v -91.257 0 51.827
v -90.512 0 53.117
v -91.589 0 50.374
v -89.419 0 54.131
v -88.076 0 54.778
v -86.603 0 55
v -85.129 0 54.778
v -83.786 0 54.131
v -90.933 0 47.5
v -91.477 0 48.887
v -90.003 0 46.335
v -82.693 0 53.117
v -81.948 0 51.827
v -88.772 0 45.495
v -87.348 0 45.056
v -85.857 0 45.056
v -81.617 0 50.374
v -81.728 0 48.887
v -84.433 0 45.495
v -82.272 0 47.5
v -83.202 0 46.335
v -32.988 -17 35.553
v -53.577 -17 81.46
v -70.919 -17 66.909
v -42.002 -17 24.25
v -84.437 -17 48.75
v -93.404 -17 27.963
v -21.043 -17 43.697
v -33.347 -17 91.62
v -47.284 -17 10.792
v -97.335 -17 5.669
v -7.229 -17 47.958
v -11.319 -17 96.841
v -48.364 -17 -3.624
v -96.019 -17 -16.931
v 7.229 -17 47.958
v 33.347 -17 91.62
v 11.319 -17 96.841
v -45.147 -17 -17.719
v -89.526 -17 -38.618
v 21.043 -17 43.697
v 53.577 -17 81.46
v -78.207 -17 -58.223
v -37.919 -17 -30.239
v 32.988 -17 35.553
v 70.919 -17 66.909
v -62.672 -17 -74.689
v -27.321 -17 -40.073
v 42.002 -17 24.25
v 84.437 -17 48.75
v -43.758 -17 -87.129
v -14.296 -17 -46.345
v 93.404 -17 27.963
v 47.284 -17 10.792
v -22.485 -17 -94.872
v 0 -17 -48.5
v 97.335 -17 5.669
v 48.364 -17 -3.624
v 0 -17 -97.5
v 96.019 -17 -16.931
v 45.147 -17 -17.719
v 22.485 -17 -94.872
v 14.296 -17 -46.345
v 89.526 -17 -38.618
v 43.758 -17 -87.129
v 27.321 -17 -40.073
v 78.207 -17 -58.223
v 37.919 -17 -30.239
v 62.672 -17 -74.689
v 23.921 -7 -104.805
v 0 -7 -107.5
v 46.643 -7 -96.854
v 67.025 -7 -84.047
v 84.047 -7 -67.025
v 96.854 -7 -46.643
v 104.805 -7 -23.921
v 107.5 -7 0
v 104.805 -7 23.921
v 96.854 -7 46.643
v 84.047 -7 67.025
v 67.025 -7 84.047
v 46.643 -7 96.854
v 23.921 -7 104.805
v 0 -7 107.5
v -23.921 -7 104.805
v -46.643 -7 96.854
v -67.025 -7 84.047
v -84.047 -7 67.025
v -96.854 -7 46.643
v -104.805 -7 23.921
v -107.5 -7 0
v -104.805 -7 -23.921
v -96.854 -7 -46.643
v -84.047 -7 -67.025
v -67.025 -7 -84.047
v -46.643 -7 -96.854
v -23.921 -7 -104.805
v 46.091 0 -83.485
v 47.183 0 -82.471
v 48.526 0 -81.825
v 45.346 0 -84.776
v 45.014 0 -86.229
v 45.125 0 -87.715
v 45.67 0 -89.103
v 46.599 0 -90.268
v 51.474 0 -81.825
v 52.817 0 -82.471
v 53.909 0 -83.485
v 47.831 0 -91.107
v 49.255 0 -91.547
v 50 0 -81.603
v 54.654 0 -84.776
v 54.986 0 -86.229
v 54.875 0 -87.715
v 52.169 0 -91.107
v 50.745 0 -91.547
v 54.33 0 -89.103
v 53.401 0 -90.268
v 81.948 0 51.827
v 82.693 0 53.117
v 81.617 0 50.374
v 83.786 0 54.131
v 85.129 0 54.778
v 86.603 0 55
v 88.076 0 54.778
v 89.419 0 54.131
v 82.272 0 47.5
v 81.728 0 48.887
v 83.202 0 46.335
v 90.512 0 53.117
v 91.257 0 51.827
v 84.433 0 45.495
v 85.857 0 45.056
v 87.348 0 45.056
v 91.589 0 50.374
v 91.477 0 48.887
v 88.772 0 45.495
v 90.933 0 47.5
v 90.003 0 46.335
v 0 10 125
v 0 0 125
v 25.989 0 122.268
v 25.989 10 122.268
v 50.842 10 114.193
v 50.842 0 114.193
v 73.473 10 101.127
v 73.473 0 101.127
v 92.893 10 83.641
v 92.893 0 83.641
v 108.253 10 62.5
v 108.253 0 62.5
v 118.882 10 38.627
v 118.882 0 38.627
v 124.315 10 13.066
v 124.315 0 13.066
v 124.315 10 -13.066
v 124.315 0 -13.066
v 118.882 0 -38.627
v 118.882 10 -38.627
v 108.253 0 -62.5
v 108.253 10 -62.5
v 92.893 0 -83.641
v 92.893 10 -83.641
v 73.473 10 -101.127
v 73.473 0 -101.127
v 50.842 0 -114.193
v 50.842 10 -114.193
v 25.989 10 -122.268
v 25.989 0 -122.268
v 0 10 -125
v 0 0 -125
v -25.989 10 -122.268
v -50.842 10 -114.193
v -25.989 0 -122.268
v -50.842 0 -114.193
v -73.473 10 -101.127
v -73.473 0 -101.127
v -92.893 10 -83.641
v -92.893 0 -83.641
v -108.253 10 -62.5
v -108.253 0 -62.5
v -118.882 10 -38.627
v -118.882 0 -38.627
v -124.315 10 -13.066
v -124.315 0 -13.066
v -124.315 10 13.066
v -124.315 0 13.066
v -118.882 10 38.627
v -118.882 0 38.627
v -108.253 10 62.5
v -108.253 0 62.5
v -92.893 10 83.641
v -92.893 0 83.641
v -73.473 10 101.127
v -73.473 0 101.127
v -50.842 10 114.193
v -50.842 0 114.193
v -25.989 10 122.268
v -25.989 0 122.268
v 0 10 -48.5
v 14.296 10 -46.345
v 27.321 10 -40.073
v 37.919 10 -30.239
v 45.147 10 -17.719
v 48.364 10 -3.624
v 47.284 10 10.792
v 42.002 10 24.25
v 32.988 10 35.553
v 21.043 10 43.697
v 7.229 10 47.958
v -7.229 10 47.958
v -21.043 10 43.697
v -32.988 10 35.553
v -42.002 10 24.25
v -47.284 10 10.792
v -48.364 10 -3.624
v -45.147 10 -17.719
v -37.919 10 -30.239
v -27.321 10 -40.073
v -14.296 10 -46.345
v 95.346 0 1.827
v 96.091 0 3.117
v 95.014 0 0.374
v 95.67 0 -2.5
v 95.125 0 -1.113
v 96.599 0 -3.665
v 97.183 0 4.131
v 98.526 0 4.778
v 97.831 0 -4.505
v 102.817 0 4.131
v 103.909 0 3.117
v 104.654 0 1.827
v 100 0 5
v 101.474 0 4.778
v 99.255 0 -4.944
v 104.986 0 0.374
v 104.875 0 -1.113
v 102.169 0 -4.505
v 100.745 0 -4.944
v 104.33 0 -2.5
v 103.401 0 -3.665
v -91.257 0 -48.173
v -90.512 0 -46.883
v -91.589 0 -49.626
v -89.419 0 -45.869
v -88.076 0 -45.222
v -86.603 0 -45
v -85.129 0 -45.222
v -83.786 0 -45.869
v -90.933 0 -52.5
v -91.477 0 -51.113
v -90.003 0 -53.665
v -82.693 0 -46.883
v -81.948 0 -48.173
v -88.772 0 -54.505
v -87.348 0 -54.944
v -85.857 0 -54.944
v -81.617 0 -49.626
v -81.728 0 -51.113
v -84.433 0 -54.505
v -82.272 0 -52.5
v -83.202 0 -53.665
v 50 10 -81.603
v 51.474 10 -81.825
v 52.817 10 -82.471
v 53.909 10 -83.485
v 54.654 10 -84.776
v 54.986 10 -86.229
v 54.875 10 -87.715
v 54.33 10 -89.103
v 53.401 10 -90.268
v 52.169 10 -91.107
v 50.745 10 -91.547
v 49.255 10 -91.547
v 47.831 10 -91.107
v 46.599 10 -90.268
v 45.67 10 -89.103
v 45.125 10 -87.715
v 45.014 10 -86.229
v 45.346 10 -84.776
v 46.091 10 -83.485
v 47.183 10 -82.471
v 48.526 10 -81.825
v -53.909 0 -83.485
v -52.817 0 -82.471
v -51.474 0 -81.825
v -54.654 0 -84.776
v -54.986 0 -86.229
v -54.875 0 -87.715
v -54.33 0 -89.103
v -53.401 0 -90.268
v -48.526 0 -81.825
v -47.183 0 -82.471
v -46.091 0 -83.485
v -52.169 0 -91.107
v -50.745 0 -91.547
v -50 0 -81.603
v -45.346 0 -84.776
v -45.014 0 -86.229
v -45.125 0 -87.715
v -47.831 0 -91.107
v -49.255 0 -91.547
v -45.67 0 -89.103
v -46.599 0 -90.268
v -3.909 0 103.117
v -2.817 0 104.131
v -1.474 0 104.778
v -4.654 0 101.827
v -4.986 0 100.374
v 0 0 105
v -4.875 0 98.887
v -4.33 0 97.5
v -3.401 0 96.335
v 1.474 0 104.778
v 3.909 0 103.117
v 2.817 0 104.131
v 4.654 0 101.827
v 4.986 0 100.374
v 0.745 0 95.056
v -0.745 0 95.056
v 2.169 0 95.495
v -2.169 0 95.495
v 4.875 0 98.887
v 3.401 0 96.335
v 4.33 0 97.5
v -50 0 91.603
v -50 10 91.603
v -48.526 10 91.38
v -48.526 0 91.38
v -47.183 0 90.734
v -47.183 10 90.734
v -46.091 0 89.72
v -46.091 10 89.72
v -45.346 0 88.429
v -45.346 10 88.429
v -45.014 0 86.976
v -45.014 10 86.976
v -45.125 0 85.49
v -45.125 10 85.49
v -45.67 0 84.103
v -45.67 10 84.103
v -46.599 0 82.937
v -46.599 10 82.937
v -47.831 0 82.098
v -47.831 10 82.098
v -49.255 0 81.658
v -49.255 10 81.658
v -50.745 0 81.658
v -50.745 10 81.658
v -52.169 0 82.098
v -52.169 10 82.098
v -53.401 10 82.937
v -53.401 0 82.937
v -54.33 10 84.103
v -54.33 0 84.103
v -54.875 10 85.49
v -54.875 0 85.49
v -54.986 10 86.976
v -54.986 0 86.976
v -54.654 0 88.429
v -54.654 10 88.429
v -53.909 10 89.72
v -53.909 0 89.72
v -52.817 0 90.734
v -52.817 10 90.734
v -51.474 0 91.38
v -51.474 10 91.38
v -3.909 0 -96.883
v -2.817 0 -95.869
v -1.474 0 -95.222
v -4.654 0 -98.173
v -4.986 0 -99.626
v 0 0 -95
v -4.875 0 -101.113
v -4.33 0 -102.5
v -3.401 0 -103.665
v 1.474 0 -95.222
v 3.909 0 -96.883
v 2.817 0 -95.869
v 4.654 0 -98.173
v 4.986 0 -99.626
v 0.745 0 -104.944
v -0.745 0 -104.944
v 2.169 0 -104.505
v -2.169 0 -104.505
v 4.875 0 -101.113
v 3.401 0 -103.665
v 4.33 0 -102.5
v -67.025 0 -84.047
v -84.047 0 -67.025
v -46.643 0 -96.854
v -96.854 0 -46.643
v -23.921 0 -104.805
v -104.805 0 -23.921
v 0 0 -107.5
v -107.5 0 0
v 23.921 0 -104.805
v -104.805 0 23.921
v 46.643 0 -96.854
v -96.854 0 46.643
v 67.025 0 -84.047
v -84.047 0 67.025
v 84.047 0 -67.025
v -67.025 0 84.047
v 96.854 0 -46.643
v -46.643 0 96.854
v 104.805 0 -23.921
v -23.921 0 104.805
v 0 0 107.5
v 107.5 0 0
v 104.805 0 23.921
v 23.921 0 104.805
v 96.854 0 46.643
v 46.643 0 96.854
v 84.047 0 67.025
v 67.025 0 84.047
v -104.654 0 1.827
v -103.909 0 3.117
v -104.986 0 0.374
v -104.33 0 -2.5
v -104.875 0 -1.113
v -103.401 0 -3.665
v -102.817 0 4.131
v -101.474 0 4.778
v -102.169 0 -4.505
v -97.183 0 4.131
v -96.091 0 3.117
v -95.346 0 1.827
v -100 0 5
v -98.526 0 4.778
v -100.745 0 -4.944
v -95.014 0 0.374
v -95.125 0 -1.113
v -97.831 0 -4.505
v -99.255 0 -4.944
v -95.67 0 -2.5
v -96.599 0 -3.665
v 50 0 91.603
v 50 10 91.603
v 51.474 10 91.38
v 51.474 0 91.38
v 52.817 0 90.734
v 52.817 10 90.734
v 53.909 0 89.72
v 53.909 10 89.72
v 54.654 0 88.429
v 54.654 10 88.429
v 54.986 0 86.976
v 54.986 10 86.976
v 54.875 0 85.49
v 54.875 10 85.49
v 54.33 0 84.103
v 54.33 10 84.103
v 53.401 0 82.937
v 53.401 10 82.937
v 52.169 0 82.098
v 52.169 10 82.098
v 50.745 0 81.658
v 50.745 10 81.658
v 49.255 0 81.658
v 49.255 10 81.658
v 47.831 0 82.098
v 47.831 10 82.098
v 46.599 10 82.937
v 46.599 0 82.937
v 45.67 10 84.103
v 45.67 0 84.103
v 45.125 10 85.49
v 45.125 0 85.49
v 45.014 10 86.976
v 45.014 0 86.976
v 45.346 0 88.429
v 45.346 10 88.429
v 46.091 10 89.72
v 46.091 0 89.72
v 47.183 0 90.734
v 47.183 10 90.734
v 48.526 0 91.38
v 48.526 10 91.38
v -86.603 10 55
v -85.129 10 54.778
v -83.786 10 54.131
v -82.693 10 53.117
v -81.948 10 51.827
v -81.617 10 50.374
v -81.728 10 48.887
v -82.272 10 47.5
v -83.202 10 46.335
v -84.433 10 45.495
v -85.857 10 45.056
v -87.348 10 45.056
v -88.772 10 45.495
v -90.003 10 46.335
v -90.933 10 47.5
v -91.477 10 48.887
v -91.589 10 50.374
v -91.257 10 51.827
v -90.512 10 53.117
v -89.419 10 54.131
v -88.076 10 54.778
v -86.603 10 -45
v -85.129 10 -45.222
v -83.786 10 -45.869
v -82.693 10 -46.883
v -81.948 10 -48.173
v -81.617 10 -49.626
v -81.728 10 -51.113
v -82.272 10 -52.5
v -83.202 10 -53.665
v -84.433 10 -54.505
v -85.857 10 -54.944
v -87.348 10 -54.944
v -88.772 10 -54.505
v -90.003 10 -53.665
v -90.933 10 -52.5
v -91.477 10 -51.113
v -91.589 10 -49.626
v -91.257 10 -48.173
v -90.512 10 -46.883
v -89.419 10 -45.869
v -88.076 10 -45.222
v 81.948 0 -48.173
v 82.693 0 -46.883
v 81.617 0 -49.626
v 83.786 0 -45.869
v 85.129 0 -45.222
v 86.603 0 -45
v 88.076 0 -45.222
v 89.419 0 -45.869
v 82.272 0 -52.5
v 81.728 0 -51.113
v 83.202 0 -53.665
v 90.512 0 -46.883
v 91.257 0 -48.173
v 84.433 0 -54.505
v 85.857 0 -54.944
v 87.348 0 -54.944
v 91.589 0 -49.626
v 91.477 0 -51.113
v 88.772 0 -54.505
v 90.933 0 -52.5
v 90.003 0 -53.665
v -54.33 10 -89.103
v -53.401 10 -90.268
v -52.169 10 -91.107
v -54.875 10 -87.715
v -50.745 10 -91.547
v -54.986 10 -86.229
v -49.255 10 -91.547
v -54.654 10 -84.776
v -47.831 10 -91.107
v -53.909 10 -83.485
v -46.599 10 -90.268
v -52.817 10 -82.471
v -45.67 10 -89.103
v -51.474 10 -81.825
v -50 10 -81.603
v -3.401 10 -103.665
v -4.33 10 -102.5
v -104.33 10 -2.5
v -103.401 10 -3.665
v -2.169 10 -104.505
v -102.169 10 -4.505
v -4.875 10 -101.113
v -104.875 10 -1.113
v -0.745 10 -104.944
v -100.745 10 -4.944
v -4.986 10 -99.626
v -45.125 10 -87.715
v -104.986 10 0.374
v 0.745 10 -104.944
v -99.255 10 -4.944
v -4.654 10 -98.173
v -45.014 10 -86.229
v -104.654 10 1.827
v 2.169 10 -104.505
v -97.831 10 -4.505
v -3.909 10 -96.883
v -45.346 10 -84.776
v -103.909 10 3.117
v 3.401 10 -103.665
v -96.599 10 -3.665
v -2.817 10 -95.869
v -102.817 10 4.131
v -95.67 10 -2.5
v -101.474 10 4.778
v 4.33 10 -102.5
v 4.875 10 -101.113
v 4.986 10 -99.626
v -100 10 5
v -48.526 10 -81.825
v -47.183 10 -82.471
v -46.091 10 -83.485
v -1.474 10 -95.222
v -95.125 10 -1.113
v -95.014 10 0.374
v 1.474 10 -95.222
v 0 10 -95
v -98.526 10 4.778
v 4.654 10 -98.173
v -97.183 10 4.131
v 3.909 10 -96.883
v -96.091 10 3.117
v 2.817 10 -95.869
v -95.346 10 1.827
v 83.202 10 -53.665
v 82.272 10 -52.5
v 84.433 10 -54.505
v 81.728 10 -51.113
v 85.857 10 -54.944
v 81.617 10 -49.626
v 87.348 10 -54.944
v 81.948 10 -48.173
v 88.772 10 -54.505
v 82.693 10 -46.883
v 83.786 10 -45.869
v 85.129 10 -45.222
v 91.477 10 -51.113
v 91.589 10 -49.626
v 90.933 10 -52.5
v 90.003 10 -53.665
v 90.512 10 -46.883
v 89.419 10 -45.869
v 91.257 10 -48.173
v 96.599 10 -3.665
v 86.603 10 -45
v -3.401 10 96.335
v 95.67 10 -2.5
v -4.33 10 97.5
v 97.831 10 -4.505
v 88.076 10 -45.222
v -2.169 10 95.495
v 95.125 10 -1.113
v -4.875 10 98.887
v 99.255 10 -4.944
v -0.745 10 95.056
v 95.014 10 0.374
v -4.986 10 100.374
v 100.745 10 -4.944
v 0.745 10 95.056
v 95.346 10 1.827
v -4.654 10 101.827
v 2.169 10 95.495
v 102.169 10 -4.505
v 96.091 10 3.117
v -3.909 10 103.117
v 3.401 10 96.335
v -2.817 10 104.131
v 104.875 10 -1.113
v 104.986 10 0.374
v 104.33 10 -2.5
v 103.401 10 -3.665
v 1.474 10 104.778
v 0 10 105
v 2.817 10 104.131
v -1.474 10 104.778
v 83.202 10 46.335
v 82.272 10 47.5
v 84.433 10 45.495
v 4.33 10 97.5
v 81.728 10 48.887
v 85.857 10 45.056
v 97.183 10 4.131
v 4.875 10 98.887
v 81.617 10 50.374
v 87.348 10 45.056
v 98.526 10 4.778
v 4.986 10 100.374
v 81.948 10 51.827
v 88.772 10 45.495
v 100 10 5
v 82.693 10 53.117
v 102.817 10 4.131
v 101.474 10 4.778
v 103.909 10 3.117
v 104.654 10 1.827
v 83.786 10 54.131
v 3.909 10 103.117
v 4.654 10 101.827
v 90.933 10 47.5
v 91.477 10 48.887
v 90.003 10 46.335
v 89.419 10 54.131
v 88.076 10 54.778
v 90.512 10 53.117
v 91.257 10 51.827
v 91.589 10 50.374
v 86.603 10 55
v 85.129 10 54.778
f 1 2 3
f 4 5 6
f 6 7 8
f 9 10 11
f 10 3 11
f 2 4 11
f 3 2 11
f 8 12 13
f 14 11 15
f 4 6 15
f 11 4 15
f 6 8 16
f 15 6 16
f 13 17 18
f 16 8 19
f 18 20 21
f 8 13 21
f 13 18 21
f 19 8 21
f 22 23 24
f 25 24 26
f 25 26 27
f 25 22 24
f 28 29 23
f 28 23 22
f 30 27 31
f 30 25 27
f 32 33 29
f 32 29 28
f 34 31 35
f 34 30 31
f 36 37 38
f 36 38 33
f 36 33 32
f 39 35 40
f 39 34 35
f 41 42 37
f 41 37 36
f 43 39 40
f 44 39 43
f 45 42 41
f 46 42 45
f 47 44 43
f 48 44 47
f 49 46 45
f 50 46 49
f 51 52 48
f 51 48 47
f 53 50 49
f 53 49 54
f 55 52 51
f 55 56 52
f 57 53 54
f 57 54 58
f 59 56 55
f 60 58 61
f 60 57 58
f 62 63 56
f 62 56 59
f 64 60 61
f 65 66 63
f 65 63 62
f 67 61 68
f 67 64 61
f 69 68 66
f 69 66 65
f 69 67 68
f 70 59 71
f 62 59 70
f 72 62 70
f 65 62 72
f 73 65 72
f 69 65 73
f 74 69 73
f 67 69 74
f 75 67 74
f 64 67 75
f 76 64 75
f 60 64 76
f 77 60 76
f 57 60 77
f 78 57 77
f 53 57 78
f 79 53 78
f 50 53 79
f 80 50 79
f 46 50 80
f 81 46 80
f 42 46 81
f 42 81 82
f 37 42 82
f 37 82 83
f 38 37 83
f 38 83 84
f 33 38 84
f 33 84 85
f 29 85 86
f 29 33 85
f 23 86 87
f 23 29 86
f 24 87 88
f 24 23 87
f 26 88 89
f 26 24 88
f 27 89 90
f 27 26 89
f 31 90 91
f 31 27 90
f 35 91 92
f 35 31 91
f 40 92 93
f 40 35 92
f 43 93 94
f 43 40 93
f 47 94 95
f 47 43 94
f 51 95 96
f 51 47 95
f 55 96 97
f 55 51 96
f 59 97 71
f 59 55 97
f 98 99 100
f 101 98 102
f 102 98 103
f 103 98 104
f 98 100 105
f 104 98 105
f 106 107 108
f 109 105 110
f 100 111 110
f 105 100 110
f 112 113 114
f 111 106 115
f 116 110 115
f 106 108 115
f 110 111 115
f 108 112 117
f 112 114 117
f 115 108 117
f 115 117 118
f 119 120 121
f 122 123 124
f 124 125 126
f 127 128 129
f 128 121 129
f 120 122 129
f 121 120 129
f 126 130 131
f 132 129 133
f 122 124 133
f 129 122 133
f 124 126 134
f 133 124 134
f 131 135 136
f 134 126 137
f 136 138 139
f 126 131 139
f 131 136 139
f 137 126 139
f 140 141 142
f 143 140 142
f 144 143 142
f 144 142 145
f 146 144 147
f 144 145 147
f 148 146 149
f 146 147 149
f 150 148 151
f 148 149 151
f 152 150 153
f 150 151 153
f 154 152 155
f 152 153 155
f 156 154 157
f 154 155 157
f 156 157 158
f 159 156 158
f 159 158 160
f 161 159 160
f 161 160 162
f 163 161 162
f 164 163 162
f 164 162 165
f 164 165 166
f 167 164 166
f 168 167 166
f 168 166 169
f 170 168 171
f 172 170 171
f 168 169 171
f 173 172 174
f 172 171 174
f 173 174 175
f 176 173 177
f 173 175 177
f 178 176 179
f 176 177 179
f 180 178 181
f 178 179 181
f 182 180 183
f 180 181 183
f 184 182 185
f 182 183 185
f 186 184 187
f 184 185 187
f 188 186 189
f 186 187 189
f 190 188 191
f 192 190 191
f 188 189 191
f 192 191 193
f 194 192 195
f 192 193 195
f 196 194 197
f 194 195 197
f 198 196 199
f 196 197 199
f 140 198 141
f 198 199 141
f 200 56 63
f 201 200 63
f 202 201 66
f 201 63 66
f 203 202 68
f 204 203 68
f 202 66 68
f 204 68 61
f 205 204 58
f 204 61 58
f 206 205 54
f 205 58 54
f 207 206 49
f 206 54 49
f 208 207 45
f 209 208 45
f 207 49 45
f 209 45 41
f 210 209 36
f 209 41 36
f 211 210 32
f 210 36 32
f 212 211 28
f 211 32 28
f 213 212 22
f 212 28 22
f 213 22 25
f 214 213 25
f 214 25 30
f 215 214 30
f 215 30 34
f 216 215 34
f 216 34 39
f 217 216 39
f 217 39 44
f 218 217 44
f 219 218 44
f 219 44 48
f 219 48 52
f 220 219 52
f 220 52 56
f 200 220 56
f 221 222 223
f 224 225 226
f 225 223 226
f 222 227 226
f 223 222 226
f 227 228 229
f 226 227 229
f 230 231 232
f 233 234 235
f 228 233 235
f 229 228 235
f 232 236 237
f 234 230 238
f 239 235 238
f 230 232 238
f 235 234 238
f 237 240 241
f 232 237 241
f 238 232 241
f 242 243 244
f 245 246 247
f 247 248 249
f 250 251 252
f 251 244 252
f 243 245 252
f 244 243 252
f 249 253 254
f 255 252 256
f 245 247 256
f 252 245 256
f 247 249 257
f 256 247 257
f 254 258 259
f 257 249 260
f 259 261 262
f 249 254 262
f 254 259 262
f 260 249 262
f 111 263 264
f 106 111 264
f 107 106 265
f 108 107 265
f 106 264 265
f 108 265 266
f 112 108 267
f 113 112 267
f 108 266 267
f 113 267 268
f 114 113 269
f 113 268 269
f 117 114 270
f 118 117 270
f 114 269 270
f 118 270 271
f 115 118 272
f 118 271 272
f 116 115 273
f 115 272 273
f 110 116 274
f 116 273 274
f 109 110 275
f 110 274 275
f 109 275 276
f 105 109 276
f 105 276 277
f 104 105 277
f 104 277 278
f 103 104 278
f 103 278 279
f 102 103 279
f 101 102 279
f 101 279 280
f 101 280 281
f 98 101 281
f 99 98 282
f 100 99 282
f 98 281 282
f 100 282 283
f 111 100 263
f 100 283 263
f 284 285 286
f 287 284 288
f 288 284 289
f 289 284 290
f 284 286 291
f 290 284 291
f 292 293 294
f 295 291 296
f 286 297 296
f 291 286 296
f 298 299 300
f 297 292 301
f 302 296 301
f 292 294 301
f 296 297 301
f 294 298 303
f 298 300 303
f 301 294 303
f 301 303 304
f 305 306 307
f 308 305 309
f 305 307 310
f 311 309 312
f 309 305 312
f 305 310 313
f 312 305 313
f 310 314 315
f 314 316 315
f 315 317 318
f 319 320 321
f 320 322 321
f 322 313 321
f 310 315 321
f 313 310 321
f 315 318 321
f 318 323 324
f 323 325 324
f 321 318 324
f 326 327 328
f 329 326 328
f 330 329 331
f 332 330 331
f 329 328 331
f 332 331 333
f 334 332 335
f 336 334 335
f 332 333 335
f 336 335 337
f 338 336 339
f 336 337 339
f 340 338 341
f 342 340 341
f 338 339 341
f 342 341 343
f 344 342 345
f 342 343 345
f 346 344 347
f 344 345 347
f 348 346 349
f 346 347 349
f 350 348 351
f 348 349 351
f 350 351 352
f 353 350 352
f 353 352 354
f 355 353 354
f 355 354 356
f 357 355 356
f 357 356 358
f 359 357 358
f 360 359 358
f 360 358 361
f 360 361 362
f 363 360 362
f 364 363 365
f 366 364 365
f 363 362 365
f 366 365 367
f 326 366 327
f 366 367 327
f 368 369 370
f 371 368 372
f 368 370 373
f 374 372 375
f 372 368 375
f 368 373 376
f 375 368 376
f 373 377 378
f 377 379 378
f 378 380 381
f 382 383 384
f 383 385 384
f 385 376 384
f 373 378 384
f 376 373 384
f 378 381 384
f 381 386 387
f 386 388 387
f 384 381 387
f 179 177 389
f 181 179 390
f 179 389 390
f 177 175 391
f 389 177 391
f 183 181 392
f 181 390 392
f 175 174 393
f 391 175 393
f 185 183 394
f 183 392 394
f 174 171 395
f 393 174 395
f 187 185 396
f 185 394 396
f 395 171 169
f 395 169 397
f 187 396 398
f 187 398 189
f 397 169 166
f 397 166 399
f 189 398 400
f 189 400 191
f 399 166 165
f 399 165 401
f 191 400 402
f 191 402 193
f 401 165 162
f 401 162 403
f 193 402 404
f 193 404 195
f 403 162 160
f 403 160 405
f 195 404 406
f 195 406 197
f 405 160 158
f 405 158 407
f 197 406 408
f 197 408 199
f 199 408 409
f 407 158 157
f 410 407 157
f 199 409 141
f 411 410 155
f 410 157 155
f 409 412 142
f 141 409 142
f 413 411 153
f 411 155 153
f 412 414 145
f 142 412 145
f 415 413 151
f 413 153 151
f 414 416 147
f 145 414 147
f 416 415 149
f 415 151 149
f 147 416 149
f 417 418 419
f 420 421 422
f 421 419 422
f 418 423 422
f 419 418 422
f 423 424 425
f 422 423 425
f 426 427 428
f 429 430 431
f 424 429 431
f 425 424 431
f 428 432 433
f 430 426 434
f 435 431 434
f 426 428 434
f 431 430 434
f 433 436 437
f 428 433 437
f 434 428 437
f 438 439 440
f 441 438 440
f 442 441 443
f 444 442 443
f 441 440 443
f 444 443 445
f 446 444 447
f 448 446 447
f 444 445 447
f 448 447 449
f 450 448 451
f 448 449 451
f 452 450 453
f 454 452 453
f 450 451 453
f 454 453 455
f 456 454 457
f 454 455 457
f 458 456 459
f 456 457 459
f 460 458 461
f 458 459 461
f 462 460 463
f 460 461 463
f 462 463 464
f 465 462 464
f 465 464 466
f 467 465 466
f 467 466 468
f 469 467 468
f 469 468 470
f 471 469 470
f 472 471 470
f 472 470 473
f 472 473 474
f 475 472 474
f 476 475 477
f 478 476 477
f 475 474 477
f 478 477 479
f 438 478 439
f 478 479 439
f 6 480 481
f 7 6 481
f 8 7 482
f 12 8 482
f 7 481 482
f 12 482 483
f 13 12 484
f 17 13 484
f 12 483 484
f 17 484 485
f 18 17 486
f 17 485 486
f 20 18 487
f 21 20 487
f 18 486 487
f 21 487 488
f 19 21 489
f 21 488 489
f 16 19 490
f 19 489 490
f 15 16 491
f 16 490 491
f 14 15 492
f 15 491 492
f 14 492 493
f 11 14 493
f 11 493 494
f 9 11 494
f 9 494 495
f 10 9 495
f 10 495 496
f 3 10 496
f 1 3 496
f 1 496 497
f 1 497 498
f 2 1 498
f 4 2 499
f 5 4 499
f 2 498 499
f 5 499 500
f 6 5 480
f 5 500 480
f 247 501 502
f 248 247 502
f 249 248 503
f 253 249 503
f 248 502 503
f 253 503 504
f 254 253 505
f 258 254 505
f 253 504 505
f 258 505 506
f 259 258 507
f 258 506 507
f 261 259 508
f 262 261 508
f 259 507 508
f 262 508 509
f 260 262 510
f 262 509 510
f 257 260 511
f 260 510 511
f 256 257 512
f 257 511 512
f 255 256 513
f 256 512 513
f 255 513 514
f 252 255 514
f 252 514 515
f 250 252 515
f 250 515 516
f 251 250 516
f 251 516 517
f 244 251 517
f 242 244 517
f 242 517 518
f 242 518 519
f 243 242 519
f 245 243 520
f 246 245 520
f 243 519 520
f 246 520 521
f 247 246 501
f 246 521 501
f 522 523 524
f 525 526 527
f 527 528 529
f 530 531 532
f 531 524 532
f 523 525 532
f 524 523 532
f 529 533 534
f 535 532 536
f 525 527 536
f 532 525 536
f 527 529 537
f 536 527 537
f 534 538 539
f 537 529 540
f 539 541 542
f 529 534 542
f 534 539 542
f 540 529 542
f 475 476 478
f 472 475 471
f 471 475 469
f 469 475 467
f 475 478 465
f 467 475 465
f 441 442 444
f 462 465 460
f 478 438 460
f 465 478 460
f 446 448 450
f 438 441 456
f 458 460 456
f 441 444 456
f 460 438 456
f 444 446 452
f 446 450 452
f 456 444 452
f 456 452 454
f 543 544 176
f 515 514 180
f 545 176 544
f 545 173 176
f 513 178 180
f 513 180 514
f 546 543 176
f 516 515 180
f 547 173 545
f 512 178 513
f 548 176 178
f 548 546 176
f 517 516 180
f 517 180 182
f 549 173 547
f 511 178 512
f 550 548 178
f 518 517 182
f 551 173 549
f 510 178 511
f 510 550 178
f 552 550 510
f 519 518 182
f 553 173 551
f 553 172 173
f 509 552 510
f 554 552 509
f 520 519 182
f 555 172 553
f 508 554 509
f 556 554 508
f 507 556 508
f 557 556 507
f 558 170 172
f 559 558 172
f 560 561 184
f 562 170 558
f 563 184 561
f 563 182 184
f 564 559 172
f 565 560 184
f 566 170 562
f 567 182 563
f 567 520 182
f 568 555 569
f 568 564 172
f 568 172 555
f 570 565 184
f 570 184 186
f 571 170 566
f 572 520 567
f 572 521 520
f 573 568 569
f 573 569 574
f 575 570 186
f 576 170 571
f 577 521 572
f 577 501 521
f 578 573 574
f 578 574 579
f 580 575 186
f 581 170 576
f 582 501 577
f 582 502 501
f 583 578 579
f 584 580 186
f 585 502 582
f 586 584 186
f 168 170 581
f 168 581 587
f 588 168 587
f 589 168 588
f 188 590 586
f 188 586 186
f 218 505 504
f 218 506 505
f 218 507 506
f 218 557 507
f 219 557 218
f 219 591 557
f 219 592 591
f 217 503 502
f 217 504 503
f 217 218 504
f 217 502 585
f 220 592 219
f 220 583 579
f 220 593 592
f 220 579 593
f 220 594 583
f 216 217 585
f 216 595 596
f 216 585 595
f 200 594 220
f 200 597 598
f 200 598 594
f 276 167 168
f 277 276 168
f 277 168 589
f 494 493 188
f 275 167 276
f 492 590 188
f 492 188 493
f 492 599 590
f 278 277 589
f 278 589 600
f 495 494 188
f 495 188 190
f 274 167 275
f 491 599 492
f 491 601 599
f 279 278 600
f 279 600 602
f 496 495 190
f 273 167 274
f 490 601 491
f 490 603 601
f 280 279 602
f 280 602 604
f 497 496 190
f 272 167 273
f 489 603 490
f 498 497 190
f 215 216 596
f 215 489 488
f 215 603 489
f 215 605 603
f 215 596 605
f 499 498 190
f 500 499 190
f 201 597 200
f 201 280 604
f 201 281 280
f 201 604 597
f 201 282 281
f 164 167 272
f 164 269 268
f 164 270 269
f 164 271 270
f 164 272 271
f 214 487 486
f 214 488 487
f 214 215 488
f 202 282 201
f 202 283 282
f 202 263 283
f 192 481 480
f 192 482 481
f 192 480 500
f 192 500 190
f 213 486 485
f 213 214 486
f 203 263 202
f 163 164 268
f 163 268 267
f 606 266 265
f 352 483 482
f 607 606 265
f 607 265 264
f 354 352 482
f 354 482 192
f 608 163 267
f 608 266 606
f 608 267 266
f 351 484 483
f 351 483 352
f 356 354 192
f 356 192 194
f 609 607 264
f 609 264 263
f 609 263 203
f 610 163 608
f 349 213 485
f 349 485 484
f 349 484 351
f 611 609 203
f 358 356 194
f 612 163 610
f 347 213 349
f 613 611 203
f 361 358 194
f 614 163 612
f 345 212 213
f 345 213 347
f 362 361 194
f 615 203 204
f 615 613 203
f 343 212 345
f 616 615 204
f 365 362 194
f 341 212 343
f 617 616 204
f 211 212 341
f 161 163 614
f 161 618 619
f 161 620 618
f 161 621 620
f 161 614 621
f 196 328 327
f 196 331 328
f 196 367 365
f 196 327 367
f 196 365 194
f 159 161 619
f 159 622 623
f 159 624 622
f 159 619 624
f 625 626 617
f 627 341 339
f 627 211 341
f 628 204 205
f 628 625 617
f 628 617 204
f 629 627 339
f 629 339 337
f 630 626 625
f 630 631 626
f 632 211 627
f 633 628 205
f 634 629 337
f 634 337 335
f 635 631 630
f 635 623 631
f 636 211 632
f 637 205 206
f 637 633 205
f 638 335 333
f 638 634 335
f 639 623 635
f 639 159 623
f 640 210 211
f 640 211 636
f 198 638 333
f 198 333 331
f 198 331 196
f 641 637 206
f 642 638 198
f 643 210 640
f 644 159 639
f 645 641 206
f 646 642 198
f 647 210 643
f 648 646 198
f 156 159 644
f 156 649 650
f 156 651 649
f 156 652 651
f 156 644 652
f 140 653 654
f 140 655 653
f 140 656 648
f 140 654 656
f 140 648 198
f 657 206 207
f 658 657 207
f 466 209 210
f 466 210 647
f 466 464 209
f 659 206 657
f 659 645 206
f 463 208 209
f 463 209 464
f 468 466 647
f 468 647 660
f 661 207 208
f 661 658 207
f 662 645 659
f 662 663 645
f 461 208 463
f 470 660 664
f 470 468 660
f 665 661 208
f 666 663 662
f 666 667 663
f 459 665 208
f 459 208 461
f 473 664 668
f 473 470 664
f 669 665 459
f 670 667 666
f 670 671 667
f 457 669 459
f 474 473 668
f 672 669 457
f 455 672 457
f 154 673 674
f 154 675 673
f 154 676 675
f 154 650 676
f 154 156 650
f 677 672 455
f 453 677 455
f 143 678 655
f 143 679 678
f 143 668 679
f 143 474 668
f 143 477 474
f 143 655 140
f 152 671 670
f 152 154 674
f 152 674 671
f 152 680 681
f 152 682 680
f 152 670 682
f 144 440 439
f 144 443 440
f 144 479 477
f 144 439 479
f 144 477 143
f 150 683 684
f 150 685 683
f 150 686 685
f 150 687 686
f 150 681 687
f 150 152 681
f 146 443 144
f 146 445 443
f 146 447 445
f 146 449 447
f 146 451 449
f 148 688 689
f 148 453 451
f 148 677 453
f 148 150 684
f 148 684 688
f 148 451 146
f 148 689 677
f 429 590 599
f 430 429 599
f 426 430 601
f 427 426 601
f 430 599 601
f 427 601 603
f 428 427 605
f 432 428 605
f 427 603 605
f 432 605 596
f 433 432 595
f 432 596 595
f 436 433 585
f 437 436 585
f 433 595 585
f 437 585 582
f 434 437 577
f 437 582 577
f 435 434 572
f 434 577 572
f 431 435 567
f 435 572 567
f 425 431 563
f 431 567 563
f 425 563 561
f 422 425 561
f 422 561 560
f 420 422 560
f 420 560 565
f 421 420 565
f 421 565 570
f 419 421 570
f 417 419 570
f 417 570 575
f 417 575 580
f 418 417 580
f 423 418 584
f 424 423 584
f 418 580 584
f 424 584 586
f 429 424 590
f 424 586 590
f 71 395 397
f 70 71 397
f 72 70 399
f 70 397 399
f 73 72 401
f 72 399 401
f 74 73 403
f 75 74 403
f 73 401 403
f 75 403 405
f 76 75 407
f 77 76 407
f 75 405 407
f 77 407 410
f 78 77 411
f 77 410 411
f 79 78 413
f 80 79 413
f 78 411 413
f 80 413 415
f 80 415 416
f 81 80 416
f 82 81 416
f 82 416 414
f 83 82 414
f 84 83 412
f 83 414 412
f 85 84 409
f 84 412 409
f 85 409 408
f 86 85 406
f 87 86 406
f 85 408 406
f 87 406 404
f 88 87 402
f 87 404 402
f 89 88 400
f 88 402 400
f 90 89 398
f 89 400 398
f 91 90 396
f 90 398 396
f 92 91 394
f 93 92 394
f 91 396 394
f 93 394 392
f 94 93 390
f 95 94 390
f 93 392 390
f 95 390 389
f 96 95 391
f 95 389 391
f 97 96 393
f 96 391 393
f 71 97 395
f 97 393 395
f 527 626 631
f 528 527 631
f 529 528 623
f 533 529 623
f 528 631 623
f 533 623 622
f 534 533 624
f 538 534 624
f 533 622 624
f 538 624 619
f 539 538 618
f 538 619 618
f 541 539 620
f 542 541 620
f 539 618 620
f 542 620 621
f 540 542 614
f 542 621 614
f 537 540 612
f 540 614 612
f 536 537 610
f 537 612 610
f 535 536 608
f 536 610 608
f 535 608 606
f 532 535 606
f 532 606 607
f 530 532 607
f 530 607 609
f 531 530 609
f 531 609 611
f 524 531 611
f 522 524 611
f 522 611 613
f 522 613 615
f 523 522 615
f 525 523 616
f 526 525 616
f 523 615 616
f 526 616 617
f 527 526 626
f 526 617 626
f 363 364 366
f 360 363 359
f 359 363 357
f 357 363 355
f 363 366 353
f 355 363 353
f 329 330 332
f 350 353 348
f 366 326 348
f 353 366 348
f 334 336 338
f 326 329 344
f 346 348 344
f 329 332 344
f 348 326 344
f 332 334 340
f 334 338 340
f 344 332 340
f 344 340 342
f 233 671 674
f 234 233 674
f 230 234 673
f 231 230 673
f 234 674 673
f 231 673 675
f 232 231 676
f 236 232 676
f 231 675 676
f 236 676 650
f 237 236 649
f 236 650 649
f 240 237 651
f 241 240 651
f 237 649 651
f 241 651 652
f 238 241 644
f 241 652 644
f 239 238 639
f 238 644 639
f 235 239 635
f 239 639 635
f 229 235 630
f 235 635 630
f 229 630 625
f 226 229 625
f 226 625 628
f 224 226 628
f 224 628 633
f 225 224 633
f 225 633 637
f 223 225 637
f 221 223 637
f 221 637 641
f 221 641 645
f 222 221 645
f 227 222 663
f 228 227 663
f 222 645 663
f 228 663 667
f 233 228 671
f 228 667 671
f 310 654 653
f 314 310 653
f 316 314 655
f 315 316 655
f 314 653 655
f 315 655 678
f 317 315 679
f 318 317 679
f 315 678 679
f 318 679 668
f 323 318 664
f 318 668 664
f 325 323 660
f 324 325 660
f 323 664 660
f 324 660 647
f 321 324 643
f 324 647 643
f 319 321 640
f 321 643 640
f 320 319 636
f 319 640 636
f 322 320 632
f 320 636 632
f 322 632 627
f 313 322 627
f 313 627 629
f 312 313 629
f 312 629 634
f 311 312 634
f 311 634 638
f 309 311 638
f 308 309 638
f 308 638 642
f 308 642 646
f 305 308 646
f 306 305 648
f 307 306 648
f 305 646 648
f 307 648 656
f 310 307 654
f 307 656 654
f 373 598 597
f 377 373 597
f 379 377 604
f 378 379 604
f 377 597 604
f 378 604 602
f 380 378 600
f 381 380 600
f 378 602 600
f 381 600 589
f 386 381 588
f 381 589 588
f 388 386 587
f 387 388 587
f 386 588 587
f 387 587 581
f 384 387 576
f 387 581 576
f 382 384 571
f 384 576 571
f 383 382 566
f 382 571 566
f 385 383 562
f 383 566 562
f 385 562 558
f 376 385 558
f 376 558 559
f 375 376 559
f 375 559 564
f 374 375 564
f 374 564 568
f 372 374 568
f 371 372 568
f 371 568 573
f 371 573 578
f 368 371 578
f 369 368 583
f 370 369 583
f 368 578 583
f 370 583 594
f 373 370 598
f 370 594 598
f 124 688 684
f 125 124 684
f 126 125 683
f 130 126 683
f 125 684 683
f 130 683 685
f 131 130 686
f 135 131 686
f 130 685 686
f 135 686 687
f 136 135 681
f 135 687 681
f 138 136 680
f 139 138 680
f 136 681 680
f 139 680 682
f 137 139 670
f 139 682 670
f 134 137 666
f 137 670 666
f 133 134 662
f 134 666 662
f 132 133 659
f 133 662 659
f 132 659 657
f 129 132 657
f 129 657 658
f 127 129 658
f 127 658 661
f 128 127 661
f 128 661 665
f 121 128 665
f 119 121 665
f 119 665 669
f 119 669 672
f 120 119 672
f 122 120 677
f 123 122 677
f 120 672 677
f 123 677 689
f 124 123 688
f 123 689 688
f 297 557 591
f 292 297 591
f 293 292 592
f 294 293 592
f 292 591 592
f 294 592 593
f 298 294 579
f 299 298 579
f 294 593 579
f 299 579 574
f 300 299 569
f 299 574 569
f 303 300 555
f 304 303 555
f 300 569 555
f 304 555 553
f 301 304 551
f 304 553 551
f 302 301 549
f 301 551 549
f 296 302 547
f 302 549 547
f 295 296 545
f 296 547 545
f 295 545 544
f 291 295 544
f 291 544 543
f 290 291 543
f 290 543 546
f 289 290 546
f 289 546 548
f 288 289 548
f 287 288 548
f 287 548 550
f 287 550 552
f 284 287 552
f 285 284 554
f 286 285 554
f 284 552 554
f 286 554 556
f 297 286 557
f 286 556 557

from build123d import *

# Parameters (mm, degrees)
SKETCH2_R           = 125
BOSS_EXTRUDE1_DEPTH = 10
SKETCH3_R           = 5
CUT_EXTRUDE1_DEPTH  = 10
SKETCH4_R           = 107.5
BOSS_EXTRUDE2_DEPTH = 17
CHAMFER1_SIZE       = 10
SKETCH5_R           = 48.5
CUT_EXTRUDE2_DEPTH  = 57


with BuildPart() as part:
    # Sketch2 → Boss-Extrude1 (new body)
    with BuildSketch(Plane(origin=(0, 0, 0), x_dir=(1, 0, 0), z_dir=(0, 1, 0))):
        with Locations(Location((0, 0, 0), (0, 0, 270))):
            Circle(SKETCH2_R)
    extrude(amount=BOSS_EXTRUDE1_DEPTH)

    # Sketch3 → Cut-Extrude1 (cut)
    with BuildSketch(Plane(origin=(0, 10, 0), x_dir=(1, 0, 0), z_dir=(0, 1, 0))):
        with Locations(Location((100, 0, 0), (0, 0, 270))):
            Circle(SKETCH3_R)
        with Locations(Location((86.602540378, -50, 0), (0, 0, 270))):
            Circle(SKETCH3_R)
        with Locations(Location((50, -86.602540378, 0), (0, 0, 270))):
            Circle(SKETCH3_R)
        with Locations(Location((0, -100, 0), (0, 0, 270))):
            Circle(SKETCH3_R)
        with Locations(Location((-50, -86.602540378, 0), (0, 0, 270))):
            Circle(SKETCH3_R)
        with Locations(Location((-86.602540378, -50, 0), (0, 0, 270))):
            Circle(SKETCH3_R)
        with Locations(Location((-100, 0, 0), (0, 0, 270))):
            Circle(SKETCH3_R)
        with Locations(Location((-86.602540378, 50, 0), (0, 0, 270))):
            Circle(SKETCH3_R)
        with Locations(Location((-50, 86.602540378, 0), (0, 0, 270))):
            Circle(SKETCH3_R)
        with Locations(Location((0, 100, 0), (0, 0, 270))):
            Circle(SKETCH3_R)
        with Locations(Location((50, 86.602540378, 0), (0, 0, 270))):
            Circle(SKETCH3_R)
        with Locations(Location((86.602540378, 50, 0), (0, 0, 270))):
            Circle(SKETCH3_R)
    extrude(amount=-CUT_EXTRUDE1_DEPTH, mode=Mode.SUBTRACT)

    # Sketch4 → Boss-Extrude2 (add)
    with BuildSketch(Plane.XZ):
        with Locations(Location((0, 0, 0), (0, 0, 270))):
            Circle(SKETCH4_R)
    extrude(amount=BOSS_EXTRUDE2_DEPTH)

    # Chamfer1
    chamfer1_edges = [part.edges().sort_by_distance(p)[0] for p in [
        (0, -17, 107.5),
    ]]
    chamfer(chamfer1_edges, length=CHAMFER1_SIZE)

    # Sketch5 → Cut-Extrude2 (cut)
    with BuildSketch(Plane.XZ.offset(17)):
        with Locations(Location((0, 0, 0), (0, 0, 270))):
            Circle(SKETCH5_R)
    extrude(amount=-CUT_EXTRUDE2_DEPTH, mode=Mode.SUBTRACT)


solid = part.part
